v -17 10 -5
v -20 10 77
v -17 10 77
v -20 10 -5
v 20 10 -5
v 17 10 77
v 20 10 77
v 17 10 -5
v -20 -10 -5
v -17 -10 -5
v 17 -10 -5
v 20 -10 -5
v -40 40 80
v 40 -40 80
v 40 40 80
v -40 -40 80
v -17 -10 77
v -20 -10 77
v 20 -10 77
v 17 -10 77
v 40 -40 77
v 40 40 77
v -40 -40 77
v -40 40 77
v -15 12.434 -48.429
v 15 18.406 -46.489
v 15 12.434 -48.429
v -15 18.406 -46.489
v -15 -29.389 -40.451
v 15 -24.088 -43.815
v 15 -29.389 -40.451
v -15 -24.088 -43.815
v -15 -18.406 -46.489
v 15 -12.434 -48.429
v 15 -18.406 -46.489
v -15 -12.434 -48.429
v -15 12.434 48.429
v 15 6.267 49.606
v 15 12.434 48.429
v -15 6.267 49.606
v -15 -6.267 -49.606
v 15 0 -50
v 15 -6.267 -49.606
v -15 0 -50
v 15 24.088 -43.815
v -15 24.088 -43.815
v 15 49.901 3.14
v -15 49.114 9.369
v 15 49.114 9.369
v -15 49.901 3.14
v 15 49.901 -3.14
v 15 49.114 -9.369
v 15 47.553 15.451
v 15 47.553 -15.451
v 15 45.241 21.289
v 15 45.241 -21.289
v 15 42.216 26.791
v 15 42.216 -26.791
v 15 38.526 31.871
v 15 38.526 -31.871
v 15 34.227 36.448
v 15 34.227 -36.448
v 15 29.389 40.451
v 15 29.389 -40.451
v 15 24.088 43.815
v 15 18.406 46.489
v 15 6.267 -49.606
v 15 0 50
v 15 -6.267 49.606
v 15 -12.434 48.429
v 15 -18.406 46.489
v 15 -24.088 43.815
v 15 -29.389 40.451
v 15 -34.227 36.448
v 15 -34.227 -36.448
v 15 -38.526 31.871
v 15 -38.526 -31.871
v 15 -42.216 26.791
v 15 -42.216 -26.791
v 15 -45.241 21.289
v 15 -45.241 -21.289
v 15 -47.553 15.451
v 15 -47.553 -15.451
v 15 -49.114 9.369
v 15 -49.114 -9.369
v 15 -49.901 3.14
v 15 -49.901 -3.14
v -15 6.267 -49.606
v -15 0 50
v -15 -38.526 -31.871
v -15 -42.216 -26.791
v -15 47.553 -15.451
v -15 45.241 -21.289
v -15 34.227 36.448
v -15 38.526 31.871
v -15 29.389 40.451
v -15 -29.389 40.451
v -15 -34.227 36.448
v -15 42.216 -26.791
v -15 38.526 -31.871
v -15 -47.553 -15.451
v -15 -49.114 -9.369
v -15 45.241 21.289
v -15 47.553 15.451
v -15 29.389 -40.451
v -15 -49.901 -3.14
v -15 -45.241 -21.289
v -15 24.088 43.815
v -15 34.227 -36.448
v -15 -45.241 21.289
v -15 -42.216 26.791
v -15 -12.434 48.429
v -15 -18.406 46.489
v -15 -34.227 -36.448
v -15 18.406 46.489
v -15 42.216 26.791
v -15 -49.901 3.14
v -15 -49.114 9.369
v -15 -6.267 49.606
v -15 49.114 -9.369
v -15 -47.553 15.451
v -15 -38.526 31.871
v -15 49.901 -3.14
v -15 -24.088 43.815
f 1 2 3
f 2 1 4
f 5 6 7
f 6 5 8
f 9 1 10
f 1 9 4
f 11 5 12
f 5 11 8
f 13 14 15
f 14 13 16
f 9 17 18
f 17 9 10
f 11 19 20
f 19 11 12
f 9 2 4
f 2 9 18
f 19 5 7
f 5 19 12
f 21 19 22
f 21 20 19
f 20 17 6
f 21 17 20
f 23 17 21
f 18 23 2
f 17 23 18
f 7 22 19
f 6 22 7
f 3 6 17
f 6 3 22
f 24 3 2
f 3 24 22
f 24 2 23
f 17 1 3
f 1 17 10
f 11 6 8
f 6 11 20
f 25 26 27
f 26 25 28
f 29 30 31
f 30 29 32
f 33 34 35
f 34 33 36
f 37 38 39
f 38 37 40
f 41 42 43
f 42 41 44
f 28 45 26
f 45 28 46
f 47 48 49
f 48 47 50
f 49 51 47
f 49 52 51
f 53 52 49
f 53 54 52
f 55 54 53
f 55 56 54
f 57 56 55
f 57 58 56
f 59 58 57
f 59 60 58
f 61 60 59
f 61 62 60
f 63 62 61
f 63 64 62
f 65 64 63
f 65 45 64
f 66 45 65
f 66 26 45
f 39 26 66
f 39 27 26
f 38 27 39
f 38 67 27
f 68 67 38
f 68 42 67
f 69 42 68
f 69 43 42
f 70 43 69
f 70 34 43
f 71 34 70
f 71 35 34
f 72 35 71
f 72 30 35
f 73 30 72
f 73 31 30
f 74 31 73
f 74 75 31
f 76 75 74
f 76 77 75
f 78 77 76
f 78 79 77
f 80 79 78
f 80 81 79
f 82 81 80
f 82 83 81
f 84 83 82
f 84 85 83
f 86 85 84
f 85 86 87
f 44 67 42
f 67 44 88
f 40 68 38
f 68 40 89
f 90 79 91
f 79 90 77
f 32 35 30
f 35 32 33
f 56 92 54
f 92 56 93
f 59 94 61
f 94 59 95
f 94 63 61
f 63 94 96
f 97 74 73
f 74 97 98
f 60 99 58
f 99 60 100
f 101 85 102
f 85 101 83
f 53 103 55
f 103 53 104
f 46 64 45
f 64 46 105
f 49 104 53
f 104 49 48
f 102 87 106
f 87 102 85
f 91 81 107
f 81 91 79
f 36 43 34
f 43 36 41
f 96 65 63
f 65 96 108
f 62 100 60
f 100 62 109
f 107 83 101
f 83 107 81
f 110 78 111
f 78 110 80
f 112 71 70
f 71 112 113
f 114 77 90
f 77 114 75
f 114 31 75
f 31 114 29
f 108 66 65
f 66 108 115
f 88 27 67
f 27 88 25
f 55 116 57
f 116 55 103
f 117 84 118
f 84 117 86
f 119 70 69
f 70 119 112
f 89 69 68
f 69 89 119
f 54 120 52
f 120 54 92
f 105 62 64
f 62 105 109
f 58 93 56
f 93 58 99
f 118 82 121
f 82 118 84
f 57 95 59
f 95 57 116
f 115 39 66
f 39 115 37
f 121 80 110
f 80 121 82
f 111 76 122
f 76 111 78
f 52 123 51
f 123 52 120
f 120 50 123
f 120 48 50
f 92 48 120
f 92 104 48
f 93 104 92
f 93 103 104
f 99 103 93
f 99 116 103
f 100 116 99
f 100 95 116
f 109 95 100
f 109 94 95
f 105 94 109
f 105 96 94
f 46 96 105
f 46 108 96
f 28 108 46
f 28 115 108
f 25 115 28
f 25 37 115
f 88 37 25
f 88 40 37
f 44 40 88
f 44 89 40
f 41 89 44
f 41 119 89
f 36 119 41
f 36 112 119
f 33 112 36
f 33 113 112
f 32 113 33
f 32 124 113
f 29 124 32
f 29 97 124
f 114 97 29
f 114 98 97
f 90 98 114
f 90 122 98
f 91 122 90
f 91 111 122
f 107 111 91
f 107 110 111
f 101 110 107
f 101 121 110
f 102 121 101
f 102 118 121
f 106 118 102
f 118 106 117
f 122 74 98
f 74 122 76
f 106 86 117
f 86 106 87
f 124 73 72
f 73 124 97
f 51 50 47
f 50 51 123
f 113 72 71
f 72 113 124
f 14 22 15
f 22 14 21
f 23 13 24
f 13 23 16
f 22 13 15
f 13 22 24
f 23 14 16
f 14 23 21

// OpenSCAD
// file: params_alu_profiles.scad
// Author: Mihai Oltean, https://mihaioltean.github.io, mihai.oltean@gmail.com
// More details: https://jenny5.org, https://jenny5-robot.github.io/
// Source code: github.com/jenny5-robot
// MIT License
//--------------------------------------------------------------

profile_height_20x20 = 20;
profile_height_30x30 = 30;
profile_30x30_size = [30, 30];

dist_edge_profile_to_small_hole = 4;

L_profile_40x20_long_size = 40;
L_profile_40x20_short_size = 20;

rectangular_tube_30x30x3_size = [30, 30];
rectangular_tube_30x30x3_wall_thick = 2;

groove_diameter = 8.22;
groove_height = 10;
groove_wall_thick = 2.2;

sigma_profile_holes = [
[0, 0, 0],
[-11.5, -11.5, 0],
[11.5, -11.5, 0],
[-11.5, 11.5, 0],
[11.5, 11.5, 0]
];
//--------------------------------------------------------------
// file: tolerance.scad
// Author: Mihai Oltean, https://mihaioltean.github.io, mihai.oltean@gmail.com
// More details: https://jenny5.org, https://jenny5-robot.github.io/
// Source code: github.com/jenny5-robot
// MIT License
//--------------------------------------------------------------

tolerance = 0.1;
display_tolerance = 1;

overlap_tolerance = 0.01;

tolerance_z = [0, 0, tolerance];
tolerance_x = [tolerance, 0, 0];
tolerance_y = [0, tolerance, 0];

display_tolerance_z = [0, 0, display_tolerance];
display_tolerance_x = [display_tolerance, 0, 0];
display_tolerance_y = [0, display_tolerance, 0];

display_tolerance_xz = [display_tolerance, 0, display_tolerance];
display_tolerance_xy = [display_tolerance, display_tolerance, 0];
display_tolerance_yz = [0, display_tolerance, display_tolerance];

display_tolerance_xyz = [display_tolerance, display_tolerance, display_tolerance];
// file: config.scad
// Author: Mihai Oltean, https://mihaioltean.github.io, mihai.oltean@gmail.com
// More details: https://jenny5.org, https://jenny5-robot.github.io/
// Source code: github.com/jenny5-robot
// MIT License
//--------------------------------------------------------------

aluminium_color = "Silver";
screw_color = "LightSlateGray";
frame_color = aluminium_color;
shaft_color = "Silver";
plastic_color = "Yellow";
pulley_color = "DarkSlateGray";
steel_color = "LightSlateGray";
// file: utils.scad
// Author: Mihai Oltean, https://mihaioltean.github.io, mihai.oltean@gmail.com
// More details: https://jenny5.org, https://jenny5-robot.github.io/
// Source code: github.com/jenny5-robot
// MIT License
//--------------------------------------------------------------

module colt(radius, height)
{
	difference(){
		cube ([radius, radius, height]);
		cylinder	(h = height, r = radius, $fn = 30);
	}
}
/////////////////////////////////////////////////////////////////////////////////////////////////////////////////////////
module colt_sferic(radius)
{
	difference(){
		cube ([radius, radius, radius]);
		sphere(r = radius, $fn = 40);
	}
}
/////////////////////////////////////////////////////////////////////////////////////////////////////////////////////////
module coloana_sferica(height, radius)
{
		difference(){
			cube ([height, height, height]);
			cylinder(h= height, r = radius, $fn = 50);
		}
}
/////////////////////////////////////////////////////////////////////////////////////////////////////////////////////////
// file: params_basic_components.scad
// Author: Mihai Oltean, https://mihaioltean.github.io, mihai.oltean@gmail.com
// More details: https://jenny5.org, https://jenny5-robot.github.io/
// Source code: github.com/jenny5-robot
// MIT License
//--------------------------------------------------------------

spring_length = 20;

smooth_rod_8_radius = 4;
smooth_rod_10_radius = 5;
smooth_rod_12_radius = 6;

wall_thick_1 = 1;
wall_thick_2 = 2;
wall_thick_3 = 3;
wall_thick_4 = 4;
wall_thick_5 = 5;
wall_thick_5_5 = 5.5;
wall_thick_6 = 6;
wall_thick_7 = 7;
wall_thick_8 = 8;
wall_thick_9 = 9;
wall_thick_10 = 10;
wall_thick_12 = 12;
// file: alu_profiles.scad
// Author: Mihai Oltean, https://mihaioltean.github.io, mihai.oltean@gmail.com
// More details: https://jenny5.org, https://jenny5-robot.github.io/
// Source code: github.com/jenny5-robot
// MIT License
//--------------------------------------------------------------

include <params_basic_components.scad>
include <config.scad>
include <params_alu_profiles.scad>
include <tolerance.scad>

//-----------------------------------------------------------------------
module alu_sigma_profile_30x30(length)
{//
	perete = wall_thick_2;
	adancime = 9;
	diametru_mare = 16.5;
    
	
    color(frame_color)
    render()
    difference(){
        
            translate ([-profile_30x30_size[0] / 2, -profile_30x30_size[1] / 2, 0]) cube([profile_30x30_size[0], profile_30x30_size[1], length]);
// center hole
		translate (sigma_profile_holes[0] - display_tolerance_z) cylinder (h = length + 2 * display_tolerance, r = 3.4, $fn = 30);

// groves
        for (i = [0 : 3])
            rotate([0, 0, 90 * i]){
                translate ([profile_30x30_size[0] / 2 - groove_height, -groove_diameter / 2, 0] - tolerance_z) cube([groove_height, groove_diameter, length] + 2 * display_tolerance_xz);
                translate ([profile_30x30_size[0] / 2 - groove_wall_thick - 3, -8.5, 0] - tolerance_z) cube([3, 17, length] + 2 * display_tolerance_z);

                hull(){
                    translate ([5, 0, 0]) rotate ([0, 90, 0]) cylinder (h = groove_height - groove_wall_thick - 3, r1 = groove_diameter / 2, r2 = 8.5);
                    translate ([5, 0, length]) rotate ([0, 90, 0]) cylinder (h = groove_height - groove_wall_thick - 3, r1 = groove_diameter / 2, r2 = 8.5);
                }        
            }        
            
        // small holes
        for (i = [1 : 4])
            translate (sigma_profile_holes[i] - display_tolerance_z) cylinder (h = length + 2 * display_tolerance, r = 2, $fn = 20);
	}
}
//-----------------------------------------------------------------------
module U(length, base, height, wall_thick)
{
    //render(){
        difference(){
            cube ([length, base, height]);
            translate ([-display_tolerance, wall_thick, wall_thick]) cube ([length + 2 * display_tolerance, base - 2 * wall_thick, height - wall_thick + display_tolerance]);
        }
    //}
}
//--------------------------------------------------------------
module L_profile(length, edge_1_width = 20, edge_2_width = 20, wall_thick = 3)
{
  difference(){
    color (aluminium_color) cube ([edge_2_width, length, edge_1_width]);
    translate ([wall_thick, 0, wall_thick] - display_tolerance_y) cube ([edge_2_width - wall_thick, length, edge_1_width - wall_thick] + display_tolerance_xyz + display_tolerance_y);
  }
}
//--------------------------------------------------------------

alu_sigma_profile_30x30(length = 300);
// file: params_chair_wheel.scad
// Author: Mihai Oltean, https://mihaioltean.github.io, mihai.oltean@gmail.com
// More details: https://jenny5.org, https://jenny5-robot.github.io/
// Source code: github.com/jenny5-robot
// MIT License
//--------------------------------------------------------------

chair_wheel_radius = 50;
chair_wheel_height = 125;
chair_wheel_thick = 30;

chair_wheel_sheet_size = [80, 80, 3];
// main file
// Author: Mihai Oltean, https://mihaioltean.github.io, mihai.oltean@gmail.com
// More details: https://jenny5.org, https://jenny5-robot.github.io/
// Source code: github.com/jenny5-robot
// MIT License
//--------------------------------------------------------------

include <params_chair_wheel.scad>
use <basic_components.scad>
use <alu_profiles.scad>

module chair_wheel()
{
// wheel
  color ("black") translate ([-chair_wheel_thick / 2, 0, 0]) rotate([0, 90, 0]) cylinder(h = chair_wheel_thick, r = chair_wheel_radius, $fn = 50);
// U
    color ("gray")
  translate ([chair_wheel_thick - chair_wheel_thick / 2 + 5, -10, chair_wheel_height - chair_wheel_radius + 5]) mirror ([0, 0, 1]) rotate ([0, 0, 90]) U(20, chair_wheel_thick + 10, chair_wheel_height - chair_wheel_radius + 10, 3);
    
 // platform
    color ("gray")
    translate([-chair_wheel_sheet_size[0] / 2, -chair_wheel_sheet_size[1] / 2, chair_wheel_height - chair_wheel_radius + 2]) cube(chair_wheel_sheet_size);
}


chair_wheel();
